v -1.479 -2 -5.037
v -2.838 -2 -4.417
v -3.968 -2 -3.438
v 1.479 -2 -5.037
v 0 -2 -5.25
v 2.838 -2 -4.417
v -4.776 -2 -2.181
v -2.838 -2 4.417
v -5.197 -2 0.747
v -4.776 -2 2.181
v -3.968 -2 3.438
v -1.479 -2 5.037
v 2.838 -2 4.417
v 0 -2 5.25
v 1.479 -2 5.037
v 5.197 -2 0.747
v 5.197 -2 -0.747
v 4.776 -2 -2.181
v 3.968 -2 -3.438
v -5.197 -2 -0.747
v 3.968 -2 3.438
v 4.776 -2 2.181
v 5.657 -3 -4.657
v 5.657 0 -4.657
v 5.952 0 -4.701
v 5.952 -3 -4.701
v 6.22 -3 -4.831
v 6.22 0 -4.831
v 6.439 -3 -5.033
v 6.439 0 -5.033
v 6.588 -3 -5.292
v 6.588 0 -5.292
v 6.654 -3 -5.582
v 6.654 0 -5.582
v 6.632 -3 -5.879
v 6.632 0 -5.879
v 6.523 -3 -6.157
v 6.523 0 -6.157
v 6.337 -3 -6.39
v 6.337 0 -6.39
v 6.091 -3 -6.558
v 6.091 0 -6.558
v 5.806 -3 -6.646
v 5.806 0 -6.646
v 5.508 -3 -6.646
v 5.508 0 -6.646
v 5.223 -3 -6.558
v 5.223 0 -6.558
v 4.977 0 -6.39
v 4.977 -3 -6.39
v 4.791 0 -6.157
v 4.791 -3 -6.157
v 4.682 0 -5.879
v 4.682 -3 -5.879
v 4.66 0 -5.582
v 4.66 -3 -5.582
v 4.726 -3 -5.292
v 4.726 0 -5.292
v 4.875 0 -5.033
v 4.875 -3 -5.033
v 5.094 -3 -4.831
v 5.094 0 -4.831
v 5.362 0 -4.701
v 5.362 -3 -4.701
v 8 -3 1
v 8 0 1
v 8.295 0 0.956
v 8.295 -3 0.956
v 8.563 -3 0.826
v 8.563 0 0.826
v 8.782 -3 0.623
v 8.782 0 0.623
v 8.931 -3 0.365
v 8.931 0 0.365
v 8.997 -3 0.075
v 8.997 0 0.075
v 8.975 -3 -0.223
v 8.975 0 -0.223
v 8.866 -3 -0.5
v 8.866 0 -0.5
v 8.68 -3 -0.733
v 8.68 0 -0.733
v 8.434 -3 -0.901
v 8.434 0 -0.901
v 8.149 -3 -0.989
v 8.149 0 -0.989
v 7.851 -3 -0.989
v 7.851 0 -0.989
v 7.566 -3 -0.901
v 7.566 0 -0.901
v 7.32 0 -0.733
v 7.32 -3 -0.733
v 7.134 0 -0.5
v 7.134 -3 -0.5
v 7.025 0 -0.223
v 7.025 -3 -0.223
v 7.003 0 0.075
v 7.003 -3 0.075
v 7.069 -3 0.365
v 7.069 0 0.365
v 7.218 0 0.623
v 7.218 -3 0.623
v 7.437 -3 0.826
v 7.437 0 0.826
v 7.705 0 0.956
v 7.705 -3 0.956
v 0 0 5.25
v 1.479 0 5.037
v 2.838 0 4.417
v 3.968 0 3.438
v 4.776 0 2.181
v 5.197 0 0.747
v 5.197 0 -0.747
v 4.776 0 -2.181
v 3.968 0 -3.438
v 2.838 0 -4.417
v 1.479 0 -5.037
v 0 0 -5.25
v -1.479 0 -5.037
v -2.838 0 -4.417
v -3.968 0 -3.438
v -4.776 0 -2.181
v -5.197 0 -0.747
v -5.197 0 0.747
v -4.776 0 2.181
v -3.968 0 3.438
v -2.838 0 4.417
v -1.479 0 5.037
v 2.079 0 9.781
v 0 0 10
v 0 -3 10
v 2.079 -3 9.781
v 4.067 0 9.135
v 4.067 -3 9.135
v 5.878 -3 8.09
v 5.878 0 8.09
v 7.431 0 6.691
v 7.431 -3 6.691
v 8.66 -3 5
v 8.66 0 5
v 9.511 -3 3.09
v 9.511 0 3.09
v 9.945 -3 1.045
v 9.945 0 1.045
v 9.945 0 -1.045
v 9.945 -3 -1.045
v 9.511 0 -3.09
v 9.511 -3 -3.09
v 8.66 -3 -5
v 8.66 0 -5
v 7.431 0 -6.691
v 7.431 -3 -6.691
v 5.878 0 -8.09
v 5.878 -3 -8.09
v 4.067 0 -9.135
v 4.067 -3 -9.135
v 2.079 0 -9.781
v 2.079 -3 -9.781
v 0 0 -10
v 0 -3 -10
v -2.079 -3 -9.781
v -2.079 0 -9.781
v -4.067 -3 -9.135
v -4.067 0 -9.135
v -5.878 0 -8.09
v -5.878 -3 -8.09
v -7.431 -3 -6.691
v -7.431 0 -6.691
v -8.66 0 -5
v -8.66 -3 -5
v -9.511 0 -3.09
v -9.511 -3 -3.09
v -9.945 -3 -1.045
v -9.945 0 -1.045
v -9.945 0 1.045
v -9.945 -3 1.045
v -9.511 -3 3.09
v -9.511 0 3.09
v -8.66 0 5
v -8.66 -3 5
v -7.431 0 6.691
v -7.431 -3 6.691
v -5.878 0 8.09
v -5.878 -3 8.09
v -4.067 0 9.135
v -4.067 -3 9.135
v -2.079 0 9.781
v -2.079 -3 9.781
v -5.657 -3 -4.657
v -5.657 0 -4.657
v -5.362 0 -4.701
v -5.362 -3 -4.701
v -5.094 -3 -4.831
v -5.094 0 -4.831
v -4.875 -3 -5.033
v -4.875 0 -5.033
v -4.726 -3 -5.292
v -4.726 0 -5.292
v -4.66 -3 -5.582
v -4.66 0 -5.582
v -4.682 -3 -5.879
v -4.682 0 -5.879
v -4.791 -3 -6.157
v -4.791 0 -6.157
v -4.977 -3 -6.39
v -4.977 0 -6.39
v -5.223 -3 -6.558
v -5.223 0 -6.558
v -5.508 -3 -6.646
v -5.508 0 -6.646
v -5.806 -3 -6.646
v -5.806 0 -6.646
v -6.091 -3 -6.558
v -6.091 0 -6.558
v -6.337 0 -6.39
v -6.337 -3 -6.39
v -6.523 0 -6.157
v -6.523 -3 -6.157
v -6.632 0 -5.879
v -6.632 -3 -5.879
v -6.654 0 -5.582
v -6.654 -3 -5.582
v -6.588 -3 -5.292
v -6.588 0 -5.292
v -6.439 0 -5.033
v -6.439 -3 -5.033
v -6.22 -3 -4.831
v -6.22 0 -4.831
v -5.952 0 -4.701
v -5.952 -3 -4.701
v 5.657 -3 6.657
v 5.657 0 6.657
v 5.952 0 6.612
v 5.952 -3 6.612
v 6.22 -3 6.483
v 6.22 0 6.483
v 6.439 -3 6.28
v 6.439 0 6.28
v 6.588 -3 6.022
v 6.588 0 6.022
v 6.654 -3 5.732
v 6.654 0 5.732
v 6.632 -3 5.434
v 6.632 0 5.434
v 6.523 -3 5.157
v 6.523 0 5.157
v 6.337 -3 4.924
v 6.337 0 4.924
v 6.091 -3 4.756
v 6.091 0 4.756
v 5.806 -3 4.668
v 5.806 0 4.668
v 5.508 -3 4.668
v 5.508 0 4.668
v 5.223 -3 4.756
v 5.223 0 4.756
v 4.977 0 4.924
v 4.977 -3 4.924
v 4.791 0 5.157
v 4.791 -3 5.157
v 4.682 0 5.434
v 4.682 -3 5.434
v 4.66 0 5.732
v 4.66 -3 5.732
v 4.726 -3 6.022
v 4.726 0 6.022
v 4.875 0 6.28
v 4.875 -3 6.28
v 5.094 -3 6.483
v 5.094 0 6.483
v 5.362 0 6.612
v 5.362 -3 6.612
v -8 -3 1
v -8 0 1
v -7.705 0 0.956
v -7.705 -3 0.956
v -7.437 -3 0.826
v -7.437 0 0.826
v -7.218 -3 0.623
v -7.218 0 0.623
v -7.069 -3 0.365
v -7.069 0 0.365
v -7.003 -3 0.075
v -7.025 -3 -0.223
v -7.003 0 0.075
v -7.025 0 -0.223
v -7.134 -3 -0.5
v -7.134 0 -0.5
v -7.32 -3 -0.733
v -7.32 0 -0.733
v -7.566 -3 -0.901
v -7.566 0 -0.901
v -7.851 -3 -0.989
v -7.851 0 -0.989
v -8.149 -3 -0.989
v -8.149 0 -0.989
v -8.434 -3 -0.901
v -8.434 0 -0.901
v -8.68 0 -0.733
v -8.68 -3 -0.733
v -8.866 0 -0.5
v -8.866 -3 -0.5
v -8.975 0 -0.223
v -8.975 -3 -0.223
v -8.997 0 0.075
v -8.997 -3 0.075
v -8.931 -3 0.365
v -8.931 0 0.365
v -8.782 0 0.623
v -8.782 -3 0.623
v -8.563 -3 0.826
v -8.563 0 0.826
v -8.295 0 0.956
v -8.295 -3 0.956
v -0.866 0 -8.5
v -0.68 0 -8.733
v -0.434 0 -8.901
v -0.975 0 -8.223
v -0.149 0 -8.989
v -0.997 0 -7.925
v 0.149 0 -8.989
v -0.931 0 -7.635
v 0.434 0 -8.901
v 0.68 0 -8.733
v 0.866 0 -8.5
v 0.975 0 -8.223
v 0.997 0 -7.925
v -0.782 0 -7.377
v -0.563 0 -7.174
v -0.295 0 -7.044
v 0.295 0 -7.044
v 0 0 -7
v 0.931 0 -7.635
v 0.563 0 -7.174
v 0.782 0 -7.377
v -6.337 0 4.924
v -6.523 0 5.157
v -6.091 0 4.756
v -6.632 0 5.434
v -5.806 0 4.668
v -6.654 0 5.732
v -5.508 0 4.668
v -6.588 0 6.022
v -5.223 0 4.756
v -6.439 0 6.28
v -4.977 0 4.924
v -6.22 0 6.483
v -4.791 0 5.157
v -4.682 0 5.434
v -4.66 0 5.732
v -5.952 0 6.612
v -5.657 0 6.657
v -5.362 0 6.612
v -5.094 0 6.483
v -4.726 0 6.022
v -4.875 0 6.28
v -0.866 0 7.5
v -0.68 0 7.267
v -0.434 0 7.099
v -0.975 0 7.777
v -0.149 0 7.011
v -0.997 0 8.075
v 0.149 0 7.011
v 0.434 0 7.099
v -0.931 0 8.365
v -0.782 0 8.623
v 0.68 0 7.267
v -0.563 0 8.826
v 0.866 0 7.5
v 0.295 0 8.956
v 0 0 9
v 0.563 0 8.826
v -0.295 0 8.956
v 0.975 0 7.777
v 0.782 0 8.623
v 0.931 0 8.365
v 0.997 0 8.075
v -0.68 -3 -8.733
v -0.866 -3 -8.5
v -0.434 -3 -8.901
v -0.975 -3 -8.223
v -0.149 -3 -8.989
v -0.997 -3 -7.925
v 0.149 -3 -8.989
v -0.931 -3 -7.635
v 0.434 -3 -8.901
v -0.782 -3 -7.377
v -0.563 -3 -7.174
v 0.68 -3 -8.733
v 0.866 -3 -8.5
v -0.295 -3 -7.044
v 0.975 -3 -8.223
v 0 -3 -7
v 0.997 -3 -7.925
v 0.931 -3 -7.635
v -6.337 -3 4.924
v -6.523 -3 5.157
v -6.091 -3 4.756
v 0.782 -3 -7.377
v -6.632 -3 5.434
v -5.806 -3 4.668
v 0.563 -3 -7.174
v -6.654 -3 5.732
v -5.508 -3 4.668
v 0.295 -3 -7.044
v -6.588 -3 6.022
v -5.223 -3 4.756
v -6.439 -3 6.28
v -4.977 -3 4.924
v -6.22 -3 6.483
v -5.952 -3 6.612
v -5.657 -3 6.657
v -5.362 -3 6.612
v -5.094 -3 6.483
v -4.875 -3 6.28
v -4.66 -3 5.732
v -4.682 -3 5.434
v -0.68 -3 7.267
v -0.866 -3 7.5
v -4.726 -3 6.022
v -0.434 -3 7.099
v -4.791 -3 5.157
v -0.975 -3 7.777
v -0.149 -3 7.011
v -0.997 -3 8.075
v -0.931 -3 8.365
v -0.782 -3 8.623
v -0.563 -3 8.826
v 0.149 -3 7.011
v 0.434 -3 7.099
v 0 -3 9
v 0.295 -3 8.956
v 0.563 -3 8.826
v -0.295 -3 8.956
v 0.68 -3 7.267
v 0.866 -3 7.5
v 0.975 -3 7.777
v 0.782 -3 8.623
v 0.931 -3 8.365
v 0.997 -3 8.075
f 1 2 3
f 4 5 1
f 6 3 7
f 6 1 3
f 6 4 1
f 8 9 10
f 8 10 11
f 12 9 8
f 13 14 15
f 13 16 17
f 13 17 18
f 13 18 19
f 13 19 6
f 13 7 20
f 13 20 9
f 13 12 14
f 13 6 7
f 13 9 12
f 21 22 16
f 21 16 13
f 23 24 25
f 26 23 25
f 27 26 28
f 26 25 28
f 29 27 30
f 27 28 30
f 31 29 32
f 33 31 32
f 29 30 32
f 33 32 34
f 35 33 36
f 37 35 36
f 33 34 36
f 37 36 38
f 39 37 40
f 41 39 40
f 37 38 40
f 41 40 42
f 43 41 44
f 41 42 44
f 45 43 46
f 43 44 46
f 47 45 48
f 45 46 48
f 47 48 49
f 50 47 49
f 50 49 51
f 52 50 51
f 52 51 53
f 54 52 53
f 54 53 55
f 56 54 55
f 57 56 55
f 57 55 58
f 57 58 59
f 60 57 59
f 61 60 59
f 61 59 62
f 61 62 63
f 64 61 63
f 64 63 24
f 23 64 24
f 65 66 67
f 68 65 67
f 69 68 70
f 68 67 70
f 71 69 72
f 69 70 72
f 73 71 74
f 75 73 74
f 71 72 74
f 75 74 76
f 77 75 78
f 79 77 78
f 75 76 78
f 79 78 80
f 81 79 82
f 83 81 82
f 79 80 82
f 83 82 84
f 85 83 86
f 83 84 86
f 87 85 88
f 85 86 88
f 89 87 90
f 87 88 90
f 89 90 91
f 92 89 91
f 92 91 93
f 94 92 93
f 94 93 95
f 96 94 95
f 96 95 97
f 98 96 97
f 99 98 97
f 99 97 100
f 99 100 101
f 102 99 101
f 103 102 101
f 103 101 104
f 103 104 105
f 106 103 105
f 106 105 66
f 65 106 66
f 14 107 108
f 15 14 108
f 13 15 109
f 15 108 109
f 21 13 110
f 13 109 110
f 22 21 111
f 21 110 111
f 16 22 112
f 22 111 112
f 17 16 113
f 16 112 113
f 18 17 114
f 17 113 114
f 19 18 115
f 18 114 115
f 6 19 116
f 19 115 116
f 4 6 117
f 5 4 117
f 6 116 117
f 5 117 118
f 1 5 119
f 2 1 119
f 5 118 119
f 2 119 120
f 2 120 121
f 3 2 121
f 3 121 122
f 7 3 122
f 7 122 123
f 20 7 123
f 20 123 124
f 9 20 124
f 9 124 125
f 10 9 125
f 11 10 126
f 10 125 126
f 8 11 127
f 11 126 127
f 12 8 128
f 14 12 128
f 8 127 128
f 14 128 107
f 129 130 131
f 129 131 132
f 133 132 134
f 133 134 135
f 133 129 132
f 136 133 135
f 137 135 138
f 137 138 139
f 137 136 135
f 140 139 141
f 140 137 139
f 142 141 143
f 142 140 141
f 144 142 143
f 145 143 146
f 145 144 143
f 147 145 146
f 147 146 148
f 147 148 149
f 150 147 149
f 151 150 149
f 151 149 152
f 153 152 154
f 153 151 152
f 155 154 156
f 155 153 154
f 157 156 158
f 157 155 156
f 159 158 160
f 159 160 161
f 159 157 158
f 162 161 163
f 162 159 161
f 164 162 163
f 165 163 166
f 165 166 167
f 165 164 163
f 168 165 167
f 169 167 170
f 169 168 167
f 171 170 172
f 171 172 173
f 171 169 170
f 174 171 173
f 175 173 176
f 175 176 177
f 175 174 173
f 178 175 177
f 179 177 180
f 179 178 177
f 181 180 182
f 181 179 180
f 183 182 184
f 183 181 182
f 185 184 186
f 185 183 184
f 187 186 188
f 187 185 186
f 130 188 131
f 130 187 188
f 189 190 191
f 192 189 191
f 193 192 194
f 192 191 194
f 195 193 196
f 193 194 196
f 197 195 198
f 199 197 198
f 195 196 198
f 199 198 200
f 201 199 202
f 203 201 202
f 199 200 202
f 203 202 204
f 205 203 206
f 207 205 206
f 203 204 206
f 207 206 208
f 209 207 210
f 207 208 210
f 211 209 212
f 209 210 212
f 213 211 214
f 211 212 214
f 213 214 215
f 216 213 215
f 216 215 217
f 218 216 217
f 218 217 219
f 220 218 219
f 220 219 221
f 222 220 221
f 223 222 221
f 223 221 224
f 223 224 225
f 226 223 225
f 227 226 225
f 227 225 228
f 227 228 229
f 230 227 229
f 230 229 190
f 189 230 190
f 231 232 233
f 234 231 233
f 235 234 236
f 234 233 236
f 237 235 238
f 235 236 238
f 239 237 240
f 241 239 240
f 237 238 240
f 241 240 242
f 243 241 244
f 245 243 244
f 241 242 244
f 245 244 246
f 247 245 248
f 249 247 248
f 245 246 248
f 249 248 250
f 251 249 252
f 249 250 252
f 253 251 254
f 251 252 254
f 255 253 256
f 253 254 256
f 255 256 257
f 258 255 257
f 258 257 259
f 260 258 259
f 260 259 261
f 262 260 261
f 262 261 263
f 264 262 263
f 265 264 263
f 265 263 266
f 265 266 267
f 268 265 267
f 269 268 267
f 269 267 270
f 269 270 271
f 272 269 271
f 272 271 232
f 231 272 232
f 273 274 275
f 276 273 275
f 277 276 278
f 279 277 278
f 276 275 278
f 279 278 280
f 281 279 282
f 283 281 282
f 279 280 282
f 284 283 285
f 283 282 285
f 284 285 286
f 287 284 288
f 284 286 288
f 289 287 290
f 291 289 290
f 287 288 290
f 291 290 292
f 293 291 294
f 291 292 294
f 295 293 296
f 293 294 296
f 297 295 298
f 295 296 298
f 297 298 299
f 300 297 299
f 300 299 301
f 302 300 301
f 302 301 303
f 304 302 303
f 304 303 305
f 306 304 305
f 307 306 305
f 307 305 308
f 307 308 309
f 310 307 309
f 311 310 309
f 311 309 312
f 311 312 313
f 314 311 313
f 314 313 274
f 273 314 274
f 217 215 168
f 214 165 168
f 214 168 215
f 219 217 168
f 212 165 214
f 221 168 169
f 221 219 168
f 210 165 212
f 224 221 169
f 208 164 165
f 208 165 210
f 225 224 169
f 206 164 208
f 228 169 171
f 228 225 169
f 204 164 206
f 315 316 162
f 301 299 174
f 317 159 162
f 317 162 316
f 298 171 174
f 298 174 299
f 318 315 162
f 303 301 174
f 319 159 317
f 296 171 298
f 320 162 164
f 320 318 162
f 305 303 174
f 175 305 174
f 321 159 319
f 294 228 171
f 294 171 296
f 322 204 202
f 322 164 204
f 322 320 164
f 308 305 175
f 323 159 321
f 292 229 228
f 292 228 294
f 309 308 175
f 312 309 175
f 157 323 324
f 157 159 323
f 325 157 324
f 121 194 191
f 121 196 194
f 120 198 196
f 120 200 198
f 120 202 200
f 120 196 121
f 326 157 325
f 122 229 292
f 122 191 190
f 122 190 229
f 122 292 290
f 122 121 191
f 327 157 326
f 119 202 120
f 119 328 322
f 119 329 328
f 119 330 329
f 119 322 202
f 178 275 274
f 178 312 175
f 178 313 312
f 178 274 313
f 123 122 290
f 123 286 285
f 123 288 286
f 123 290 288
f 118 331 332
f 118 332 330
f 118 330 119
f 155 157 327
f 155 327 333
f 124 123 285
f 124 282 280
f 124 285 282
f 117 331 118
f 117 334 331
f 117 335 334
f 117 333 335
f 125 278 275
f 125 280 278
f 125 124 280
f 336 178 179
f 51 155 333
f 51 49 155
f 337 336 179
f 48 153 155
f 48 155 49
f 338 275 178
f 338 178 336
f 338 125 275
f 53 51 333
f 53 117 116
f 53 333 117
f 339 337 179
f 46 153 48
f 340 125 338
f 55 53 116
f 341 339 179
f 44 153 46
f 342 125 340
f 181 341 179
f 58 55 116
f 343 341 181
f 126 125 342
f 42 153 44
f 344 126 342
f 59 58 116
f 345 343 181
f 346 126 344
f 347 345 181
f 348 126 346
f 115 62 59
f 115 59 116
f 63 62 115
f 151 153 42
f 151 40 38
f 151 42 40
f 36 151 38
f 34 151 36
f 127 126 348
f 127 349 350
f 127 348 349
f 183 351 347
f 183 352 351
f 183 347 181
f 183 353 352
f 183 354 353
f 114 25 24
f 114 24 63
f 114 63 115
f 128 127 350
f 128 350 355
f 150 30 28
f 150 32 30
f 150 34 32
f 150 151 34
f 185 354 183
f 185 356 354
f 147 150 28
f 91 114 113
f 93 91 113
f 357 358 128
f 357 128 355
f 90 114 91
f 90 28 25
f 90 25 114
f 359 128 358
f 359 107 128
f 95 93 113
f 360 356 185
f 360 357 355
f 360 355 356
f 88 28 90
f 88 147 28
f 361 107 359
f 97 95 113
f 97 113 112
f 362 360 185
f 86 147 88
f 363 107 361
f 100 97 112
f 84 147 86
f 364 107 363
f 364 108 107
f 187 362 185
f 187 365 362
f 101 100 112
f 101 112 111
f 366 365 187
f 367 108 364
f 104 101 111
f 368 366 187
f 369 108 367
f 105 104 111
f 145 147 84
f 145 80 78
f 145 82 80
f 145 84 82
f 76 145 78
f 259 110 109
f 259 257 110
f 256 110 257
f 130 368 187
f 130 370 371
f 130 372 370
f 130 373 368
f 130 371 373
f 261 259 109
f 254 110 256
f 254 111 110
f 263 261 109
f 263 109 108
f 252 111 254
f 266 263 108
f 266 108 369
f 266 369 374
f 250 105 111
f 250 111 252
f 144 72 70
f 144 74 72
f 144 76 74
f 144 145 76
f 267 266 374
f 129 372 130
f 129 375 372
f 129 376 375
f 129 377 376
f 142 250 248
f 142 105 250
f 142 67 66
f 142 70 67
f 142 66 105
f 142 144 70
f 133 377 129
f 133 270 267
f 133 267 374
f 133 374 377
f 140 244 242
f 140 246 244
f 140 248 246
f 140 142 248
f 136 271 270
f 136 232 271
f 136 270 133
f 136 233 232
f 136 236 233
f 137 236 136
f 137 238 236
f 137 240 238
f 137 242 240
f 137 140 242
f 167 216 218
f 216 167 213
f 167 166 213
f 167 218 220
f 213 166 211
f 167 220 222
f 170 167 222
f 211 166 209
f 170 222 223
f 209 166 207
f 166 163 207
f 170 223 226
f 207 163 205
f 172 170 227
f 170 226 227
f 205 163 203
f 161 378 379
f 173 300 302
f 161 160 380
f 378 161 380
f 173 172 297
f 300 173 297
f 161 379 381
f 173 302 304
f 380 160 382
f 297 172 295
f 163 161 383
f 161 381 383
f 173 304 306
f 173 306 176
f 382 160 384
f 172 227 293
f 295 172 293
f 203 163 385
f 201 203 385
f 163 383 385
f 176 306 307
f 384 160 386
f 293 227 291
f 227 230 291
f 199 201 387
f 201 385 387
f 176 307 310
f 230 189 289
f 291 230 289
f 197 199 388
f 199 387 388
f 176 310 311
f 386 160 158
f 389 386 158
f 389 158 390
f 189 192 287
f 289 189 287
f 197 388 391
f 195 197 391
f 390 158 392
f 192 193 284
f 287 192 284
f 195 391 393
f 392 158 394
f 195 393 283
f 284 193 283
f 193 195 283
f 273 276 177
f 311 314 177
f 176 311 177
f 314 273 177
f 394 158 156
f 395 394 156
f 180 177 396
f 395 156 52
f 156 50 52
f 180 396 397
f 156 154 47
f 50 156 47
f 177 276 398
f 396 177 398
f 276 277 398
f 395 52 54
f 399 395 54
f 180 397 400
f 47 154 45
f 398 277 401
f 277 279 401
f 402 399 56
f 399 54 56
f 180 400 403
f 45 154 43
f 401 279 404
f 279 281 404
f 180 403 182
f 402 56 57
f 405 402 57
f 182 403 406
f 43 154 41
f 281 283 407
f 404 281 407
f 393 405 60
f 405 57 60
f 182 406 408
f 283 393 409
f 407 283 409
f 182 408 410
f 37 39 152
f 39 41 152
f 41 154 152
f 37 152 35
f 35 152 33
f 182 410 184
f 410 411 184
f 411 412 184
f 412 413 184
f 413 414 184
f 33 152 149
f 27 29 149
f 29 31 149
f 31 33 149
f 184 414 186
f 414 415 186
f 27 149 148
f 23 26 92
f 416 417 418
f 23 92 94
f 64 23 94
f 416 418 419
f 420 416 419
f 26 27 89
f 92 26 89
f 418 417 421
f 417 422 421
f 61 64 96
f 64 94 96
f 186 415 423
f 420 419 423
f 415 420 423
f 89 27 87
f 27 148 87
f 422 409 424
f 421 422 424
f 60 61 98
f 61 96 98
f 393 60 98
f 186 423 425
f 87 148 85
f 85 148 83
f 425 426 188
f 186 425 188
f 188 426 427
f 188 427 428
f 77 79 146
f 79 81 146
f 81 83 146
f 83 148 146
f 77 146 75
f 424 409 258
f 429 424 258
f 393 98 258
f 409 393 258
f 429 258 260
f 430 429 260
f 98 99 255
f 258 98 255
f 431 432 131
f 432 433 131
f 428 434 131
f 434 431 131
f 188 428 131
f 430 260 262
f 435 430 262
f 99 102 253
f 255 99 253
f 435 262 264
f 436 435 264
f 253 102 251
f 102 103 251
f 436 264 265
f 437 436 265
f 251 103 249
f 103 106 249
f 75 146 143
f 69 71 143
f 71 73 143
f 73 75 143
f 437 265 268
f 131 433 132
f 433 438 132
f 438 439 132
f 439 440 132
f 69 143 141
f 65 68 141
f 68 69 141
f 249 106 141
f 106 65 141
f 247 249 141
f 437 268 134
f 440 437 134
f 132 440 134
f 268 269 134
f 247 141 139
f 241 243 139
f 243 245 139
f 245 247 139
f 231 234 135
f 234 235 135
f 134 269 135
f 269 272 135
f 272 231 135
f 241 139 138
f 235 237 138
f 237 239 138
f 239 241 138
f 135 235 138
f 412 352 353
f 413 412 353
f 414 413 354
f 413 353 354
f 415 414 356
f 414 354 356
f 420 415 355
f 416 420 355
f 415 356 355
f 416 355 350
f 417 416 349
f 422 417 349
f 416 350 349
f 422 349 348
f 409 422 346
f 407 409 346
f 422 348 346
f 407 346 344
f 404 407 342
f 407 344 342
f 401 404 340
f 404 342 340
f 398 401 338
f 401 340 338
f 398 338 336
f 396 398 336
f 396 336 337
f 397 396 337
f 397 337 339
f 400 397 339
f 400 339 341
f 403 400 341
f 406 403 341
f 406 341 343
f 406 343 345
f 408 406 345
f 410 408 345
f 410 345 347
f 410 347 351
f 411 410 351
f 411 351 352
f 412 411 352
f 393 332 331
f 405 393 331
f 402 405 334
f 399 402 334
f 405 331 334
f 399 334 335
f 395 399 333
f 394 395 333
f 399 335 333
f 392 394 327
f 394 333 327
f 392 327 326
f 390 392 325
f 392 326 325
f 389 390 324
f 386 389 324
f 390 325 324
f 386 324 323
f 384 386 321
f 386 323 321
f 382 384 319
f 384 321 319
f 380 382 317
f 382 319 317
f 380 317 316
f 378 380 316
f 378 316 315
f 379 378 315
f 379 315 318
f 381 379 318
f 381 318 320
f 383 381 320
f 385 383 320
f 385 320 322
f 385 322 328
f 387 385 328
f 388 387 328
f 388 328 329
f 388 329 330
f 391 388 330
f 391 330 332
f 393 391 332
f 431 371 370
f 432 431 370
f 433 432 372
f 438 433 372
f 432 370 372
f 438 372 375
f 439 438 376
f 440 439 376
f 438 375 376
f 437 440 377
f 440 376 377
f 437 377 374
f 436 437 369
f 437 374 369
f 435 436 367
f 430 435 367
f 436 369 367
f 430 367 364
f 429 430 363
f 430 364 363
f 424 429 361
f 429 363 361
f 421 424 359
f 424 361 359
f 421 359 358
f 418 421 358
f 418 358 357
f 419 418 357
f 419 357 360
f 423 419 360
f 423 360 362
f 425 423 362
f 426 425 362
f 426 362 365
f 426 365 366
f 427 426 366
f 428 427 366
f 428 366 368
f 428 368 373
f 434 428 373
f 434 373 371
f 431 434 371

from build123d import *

# Parameters (mm, degrees)
SKETCH_1_R             = 10
SM_BASE_FLANGE_1_DEPTH = 3
SKETCH_6_R             = 5.25
CUT_EXTRUDE_1_DEPTH    = 2
SKETCH_7_R             = 1
CUT_EXTRUDE_2_DEPTH    = 15.456832295


# Sheet-metal steps are written as plain solids
with BuildPart() as part:
    # Sketch 1 → 基体-法兰1 (new body)
    with BuildSketch(Plane(origin=(0, 0, 0), x_dir=(1, 0, 0), z_dir=(0, 1, 0))):
        with Locations(Location((0, 0, 0), (0, 0, 270))):
            Circle(SKETCH_1_R)
    extrude(amount=-SM_BASE_FLANGE_1_DEPTH)

    # 草图6 → 切除-拉伸1 (cut)
    with BuildSketch(Plane(origin=(0, 0, 0), x_dir=(1, 0, 0), z_dir=(0, 1, 0))):
        with Locations(Location((0, 0, 0), (0, 0, 270))):
            Circle(SKETCH_6_R)
    extrude(amount=-CUT_EXTRUDE_1_DEPTH, mode=Mode.SUBTRACT)

    # 草图7 → 切除-拉伸2 (cut, through all)
    with BuildSketch(Plane(origin=(0, 0, 0), x_dir=(1, 0, 0), z_dir=(0, 1, 0))):
        with Locations(Location((0, 8, 0), (0, 0, 270))):
            Circle(SKETCH_7_R)
        with Locations(Location((5.656854249, 5.656854249, 0), (0, 0, 270))):
            Circle(SKETCH_7_R)
        with Locations(Location((8, 0, 0), (0, 0, 270))):
            Circle(SKETCH_7_R)
        with Locations(Location((5.656854249, -5.656854249, 0), (0, 0, 270))):
            Circle(SKETCH_7_R)
        with Locations(Location((0, -8, 0), (0, 0, 270))):
            Circle(SKETCH_7_R)
        with Locations(Location((-5.656854249, -5.656854249, 0), (0, 0, 270))):
            Circle(SKETCH_7_R)
        with Locations(Location((-8, 0, 0), (0, 0, 270))):
            Circle(SKETCH_7_R)
        with Locations(Location((-5.656854249, 5.656854249, 0), (0, 0, 270))):
            Circle(SKETCH_7_R)
    extrude(amount=-CUT_EXTRUDE_2_DEPTH, mode=Mode.SUBTRACT)


solid = part.part
